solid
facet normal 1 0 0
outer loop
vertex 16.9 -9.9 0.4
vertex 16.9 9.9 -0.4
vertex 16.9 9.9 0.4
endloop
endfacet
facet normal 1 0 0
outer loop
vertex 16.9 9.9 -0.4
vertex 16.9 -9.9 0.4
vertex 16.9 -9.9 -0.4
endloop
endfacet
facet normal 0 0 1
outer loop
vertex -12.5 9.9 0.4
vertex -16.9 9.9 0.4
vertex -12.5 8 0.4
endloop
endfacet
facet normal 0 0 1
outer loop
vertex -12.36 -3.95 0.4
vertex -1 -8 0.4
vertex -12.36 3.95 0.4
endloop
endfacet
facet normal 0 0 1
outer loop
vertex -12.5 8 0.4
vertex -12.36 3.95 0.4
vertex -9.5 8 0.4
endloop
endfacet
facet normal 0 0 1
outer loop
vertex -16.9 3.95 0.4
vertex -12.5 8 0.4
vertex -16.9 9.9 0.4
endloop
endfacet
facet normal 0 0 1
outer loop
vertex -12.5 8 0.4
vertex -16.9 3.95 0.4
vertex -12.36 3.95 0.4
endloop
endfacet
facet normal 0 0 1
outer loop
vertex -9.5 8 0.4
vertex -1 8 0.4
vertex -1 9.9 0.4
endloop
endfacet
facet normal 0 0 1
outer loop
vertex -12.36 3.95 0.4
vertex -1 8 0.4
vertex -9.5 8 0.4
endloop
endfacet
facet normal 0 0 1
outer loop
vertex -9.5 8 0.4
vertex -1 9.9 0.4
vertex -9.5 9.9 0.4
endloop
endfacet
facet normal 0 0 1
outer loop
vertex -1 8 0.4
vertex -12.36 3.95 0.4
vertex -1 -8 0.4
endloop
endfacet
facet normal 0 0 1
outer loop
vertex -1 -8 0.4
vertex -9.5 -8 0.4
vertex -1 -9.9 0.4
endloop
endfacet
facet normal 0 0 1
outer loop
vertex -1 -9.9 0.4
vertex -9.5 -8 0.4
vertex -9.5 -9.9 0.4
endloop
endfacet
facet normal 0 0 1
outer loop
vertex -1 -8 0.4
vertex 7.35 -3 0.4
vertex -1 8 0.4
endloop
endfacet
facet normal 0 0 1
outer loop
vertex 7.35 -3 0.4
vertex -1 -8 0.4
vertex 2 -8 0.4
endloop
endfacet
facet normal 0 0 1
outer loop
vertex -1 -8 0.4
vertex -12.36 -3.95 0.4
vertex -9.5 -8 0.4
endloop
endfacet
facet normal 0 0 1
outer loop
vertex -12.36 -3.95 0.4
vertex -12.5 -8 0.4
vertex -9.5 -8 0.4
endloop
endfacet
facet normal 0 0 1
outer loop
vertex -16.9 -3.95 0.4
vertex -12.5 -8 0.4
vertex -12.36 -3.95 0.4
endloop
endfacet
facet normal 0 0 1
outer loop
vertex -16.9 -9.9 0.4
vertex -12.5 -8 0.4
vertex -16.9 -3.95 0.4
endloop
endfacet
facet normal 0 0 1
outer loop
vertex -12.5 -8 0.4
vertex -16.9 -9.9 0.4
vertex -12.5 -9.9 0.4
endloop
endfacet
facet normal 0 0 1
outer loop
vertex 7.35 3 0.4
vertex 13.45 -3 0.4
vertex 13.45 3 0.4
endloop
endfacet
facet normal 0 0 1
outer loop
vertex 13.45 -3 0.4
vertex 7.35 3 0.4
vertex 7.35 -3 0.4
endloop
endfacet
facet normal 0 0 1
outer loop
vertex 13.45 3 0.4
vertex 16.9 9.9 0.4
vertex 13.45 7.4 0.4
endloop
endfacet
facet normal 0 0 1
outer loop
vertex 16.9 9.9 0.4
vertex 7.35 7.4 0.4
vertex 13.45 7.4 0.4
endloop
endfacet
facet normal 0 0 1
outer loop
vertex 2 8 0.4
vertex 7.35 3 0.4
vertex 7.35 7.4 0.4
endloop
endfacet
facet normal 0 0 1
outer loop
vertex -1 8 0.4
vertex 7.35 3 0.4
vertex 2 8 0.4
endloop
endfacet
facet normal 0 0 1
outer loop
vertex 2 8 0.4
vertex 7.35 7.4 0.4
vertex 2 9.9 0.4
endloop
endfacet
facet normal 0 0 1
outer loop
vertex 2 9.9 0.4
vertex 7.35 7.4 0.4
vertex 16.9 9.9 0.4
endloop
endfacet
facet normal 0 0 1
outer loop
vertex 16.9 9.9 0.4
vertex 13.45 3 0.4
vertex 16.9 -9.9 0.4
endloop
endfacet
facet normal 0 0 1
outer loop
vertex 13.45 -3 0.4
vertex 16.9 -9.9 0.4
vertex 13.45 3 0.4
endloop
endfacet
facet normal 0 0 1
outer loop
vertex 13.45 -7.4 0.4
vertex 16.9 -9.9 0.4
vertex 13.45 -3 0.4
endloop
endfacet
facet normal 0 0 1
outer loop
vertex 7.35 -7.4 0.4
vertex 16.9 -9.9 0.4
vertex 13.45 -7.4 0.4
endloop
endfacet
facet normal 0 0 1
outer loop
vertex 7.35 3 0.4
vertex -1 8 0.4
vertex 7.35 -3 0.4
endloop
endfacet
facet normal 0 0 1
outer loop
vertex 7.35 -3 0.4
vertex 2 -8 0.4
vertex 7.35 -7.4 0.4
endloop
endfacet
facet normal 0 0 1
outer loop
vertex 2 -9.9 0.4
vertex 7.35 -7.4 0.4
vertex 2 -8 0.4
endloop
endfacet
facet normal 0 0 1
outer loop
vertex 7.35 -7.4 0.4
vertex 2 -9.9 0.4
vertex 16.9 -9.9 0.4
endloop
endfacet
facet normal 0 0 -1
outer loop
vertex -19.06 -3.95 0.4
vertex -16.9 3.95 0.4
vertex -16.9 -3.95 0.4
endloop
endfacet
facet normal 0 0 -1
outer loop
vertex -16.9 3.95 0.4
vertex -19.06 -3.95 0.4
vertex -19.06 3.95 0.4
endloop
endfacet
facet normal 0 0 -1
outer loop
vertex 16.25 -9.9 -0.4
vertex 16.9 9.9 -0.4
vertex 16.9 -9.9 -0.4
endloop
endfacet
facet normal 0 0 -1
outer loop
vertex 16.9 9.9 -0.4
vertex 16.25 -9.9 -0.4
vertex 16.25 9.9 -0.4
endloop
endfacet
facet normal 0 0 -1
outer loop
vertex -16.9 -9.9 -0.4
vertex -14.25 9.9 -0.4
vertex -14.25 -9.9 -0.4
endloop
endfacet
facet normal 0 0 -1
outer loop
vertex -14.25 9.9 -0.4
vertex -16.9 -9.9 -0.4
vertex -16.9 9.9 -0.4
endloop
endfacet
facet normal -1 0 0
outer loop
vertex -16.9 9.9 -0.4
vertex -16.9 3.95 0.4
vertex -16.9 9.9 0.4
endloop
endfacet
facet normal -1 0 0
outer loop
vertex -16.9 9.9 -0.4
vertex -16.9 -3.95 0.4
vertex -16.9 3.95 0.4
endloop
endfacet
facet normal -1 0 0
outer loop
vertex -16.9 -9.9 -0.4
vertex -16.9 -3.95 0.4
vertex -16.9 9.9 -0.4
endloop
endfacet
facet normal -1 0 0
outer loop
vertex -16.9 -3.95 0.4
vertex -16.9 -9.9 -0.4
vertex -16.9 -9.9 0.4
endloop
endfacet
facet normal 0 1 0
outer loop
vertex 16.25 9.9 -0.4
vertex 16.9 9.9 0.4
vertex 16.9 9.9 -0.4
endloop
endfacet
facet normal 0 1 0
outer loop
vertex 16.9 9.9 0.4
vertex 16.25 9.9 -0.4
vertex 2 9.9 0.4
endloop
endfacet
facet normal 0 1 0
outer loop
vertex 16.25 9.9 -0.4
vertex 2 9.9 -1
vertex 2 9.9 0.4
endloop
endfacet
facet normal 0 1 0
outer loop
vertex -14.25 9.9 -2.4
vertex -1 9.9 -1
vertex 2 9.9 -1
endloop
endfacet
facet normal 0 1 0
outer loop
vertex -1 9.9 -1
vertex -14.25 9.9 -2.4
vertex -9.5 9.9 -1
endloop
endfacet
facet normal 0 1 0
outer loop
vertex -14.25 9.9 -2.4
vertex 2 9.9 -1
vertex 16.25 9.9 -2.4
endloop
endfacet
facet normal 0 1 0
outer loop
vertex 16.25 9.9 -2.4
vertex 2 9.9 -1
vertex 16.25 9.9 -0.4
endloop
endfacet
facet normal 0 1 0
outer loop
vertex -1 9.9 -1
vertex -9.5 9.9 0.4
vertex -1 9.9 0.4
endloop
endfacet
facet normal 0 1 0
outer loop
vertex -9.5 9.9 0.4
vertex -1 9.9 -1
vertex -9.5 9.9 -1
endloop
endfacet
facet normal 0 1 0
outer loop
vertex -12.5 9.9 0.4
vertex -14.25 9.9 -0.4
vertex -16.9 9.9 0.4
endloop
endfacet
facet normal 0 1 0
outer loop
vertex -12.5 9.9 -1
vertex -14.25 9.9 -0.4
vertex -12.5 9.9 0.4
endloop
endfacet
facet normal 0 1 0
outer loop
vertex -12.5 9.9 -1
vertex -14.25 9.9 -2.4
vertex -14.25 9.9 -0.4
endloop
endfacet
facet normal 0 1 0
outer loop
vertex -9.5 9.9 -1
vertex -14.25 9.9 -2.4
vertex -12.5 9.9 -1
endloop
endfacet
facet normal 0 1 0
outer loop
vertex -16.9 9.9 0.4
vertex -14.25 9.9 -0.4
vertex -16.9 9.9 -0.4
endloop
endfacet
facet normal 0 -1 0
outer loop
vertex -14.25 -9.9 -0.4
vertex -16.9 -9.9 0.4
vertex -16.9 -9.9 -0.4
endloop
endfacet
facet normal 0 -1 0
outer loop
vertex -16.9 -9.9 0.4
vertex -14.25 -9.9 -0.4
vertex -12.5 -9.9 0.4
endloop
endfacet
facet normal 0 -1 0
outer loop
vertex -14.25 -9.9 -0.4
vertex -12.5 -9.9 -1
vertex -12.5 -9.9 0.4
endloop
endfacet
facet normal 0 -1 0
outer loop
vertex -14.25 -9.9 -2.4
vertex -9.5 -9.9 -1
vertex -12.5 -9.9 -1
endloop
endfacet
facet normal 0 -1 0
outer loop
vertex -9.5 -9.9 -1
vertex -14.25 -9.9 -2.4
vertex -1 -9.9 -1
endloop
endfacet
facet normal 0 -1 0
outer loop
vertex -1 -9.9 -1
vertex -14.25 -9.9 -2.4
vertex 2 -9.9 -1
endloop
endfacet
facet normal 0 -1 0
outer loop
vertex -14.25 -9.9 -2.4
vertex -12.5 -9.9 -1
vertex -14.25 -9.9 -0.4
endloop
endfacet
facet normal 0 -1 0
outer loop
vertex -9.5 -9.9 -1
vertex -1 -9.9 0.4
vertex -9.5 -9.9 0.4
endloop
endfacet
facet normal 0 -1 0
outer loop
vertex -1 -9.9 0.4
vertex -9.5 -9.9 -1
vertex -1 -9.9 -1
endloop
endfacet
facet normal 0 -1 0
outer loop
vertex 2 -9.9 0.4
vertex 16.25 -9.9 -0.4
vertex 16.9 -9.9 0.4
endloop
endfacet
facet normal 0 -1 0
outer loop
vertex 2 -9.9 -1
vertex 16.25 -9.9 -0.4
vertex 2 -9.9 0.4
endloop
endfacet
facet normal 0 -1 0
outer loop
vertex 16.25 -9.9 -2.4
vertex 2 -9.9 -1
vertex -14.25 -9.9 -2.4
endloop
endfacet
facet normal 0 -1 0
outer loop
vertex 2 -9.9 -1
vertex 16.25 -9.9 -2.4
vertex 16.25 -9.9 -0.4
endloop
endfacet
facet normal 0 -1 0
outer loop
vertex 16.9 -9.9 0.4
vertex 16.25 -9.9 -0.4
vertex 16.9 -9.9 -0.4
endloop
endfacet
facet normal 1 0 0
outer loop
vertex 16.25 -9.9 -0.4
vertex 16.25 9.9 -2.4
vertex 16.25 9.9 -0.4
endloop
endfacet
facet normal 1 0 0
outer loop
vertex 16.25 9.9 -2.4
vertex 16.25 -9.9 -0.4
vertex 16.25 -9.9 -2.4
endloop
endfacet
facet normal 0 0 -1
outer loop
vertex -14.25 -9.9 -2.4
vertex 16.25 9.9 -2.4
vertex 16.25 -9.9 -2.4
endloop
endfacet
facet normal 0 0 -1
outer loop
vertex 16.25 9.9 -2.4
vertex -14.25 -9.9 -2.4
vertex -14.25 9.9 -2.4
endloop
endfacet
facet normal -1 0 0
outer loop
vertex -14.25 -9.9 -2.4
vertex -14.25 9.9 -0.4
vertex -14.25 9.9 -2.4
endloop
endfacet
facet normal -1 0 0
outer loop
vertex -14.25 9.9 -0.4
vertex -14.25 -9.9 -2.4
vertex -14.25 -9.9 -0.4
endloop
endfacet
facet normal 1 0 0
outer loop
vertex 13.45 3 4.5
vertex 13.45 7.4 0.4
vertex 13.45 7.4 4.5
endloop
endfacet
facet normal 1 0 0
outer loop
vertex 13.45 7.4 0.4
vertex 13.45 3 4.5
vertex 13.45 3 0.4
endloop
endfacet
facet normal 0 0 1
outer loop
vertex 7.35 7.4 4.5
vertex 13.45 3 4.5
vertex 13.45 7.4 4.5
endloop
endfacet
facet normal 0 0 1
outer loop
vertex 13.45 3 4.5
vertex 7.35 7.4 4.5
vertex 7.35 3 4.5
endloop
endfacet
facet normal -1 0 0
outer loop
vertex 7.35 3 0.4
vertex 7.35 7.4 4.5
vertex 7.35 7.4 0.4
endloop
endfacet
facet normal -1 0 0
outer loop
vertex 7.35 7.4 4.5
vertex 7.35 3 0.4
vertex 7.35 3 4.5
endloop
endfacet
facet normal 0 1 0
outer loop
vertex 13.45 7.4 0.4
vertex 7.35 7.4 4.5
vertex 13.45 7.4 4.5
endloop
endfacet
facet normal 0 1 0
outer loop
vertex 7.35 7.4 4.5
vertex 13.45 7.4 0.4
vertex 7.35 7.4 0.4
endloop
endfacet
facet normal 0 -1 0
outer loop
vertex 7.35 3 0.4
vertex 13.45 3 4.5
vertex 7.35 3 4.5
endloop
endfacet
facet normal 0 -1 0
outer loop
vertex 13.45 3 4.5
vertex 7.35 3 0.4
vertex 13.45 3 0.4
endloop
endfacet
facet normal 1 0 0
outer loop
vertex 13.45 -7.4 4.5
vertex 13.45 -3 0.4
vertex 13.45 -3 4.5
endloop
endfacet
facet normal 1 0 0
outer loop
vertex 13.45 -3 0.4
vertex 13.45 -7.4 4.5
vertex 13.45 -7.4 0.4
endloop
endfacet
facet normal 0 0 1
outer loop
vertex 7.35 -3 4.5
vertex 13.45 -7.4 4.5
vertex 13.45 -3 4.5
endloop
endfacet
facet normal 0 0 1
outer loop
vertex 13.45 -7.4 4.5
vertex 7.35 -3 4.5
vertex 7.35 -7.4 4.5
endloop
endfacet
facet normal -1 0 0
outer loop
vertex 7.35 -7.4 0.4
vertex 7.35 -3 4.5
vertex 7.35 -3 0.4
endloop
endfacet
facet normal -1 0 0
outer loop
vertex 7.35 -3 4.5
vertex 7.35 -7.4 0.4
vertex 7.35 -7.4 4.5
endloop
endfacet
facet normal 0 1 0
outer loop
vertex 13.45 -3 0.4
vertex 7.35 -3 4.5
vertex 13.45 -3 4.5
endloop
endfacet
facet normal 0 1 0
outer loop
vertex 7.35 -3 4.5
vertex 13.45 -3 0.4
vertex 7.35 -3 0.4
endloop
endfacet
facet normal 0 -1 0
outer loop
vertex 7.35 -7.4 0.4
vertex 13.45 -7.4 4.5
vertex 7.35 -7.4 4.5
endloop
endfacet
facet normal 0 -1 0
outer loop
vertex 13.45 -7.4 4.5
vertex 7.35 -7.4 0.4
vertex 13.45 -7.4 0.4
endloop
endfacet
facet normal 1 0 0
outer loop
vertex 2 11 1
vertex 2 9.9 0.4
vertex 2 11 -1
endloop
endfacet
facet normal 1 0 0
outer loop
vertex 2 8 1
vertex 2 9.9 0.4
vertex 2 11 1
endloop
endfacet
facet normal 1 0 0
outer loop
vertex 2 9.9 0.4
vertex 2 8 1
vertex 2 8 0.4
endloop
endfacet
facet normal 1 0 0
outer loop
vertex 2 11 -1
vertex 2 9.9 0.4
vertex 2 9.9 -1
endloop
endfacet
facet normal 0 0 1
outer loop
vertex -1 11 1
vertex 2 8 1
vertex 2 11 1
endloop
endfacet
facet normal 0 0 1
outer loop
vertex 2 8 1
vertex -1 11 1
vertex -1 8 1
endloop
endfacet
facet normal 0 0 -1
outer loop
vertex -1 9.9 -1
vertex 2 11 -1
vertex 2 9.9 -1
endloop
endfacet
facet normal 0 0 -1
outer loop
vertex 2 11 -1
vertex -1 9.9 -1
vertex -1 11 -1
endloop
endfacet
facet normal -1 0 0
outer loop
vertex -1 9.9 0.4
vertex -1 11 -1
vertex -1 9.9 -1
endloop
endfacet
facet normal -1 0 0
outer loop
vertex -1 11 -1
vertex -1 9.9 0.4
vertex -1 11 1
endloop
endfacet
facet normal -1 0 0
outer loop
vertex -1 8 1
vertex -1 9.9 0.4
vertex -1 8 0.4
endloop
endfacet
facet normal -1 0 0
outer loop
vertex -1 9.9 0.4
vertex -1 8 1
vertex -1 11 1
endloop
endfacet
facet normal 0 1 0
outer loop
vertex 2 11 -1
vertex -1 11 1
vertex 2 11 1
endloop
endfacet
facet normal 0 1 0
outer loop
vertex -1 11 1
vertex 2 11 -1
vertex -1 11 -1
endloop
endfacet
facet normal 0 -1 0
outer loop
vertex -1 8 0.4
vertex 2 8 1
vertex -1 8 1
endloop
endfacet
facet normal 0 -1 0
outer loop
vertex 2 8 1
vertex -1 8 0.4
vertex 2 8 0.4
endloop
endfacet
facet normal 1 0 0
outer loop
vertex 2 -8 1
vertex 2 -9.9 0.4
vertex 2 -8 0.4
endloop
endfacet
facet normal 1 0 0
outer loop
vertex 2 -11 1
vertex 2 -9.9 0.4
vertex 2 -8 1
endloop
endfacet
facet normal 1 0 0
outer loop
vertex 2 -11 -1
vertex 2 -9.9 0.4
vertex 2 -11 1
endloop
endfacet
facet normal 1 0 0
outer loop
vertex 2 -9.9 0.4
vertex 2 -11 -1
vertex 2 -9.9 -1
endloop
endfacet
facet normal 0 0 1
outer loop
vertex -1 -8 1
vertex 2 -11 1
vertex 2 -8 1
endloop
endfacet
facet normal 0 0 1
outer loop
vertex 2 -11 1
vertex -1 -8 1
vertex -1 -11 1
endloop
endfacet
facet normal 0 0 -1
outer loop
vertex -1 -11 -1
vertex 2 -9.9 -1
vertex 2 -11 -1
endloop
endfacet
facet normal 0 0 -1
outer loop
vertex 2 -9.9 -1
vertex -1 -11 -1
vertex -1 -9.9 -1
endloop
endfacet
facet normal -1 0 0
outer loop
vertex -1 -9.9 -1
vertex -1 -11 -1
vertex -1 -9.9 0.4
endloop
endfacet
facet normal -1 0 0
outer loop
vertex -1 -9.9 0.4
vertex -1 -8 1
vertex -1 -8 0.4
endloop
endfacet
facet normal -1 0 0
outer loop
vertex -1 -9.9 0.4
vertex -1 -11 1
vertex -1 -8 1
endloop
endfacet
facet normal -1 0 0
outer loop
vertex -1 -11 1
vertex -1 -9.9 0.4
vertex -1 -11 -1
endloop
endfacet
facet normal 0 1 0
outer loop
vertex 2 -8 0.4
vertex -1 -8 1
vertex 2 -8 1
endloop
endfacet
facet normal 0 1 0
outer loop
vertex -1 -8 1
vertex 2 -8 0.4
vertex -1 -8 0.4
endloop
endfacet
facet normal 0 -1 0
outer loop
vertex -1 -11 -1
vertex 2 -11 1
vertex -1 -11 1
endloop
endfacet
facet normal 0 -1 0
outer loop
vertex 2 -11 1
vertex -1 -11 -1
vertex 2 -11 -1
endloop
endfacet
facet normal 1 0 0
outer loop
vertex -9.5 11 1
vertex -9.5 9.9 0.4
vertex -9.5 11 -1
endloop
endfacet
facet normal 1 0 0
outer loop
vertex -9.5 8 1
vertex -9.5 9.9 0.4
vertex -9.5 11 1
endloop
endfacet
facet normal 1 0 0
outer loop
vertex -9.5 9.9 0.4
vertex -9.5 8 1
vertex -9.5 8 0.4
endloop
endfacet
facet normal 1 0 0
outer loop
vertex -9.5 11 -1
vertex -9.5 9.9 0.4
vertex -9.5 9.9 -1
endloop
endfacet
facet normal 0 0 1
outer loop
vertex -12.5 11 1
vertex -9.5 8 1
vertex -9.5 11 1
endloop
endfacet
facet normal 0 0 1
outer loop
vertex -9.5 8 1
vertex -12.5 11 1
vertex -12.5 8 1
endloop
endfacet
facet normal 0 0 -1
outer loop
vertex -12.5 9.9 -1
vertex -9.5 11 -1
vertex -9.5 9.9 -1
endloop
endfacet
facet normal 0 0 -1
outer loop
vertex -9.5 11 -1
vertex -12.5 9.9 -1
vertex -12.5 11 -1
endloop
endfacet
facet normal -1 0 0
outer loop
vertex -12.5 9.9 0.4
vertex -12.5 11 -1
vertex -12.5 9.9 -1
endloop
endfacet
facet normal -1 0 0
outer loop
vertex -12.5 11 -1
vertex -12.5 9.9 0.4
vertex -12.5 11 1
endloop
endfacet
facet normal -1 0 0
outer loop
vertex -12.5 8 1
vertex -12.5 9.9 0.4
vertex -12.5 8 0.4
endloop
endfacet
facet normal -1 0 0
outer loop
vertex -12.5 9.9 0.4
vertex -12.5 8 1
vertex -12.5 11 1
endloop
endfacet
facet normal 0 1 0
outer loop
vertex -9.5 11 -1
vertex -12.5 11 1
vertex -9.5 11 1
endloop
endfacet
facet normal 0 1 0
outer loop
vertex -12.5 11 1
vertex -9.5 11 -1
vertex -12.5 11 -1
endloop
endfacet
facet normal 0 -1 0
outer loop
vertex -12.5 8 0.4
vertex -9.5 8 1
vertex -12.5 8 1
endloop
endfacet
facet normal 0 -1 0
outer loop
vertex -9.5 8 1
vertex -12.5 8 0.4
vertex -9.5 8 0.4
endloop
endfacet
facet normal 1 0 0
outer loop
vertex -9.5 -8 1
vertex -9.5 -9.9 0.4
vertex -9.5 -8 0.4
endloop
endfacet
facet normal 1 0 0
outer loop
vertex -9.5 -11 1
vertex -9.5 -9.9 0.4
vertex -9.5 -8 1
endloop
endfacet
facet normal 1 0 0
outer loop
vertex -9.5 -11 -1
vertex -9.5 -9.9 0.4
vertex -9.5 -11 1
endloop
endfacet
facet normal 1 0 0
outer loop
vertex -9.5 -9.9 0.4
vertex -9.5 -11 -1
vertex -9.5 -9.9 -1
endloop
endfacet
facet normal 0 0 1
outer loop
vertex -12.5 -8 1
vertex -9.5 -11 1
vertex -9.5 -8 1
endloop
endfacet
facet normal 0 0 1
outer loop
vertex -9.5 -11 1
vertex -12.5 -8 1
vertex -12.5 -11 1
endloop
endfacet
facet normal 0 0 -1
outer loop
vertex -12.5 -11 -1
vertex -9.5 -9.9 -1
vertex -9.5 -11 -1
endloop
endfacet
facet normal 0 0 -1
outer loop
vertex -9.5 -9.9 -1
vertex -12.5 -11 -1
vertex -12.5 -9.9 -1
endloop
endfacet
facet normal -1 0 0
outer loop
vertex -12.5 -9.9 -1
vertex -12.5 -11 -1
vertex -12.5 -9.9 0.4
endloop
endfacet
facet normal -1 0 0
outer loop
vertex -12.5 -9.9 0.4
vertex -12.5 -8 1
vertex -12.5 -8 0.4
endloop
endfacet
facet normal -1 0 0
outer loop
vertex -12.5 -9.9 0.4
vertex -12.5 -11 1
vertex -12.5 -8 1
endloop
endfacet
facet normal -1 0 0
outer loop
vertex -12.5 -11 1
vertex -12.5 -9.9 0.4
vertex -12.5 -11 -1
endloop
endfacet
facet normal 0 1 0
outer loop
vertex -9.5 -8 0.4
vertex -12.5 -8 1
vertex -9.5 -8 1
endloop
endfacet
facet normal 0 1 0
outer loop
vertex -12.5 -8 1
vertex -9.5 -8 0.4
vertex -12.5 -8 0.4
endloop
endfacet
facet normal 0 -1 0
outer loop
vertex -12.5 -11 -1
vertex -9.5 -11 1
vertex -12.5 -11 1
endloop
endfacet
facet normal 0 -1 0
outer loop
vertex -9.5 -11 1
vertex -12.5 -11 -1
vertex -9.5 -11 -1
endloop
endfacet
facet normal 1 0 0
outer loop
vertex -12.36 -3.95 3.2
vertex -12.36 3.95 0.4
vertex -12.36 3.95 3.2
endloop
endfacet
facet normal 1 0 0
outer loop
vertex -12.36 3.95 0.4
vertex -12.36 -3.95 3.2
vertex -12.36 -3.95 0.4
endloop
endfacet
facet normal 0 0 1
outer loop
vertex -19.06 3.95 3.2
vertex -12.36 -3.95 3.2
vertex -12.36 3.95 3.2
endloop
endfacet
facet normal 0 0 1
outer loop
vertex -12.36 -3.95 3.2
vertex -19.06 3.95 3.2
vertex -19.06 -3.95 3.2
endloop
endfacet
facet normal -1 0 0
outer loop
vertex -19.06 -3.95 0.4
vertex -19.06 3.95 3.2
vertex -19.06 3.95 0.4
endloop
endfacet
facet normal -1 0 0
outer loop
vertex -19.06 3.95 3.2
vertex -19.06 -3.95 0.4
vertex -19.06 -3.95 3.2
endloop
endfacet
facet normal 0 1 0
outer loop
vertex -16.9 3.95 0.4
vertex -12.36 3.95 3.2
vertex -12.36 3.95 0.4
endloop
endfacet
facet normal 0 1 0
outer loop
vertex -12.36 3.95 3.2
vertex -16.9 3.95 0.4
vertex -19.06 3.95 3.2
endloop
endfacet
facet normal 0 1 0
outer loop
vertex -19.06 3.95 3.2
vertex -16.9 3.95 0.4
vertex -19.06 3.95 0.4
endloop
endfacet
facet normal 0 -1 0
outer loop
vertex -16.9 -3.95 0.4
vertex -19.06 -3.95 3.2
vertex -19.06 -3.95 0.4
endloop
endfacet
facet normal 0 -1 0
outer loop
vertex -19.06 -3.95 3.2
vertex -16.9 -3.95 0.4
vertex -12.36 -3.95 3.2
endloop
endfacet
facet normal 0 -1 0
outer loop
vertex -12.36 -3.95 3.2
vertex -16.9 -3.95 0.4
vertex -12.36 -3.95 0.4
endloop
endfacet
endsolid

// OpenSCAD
METALLIC = "silver";

BOARD_WIDTH = 19.8;
SLIM_BOARD_HEIGHT = 0.8;
SLIM_BOARD_LENGTH = 33.8;

function half(x) = x / 2;

module slim_board() {

	center_translation = [-half(SLIM_BOARD_LENGTH),-half(BOARD_WIDTH),-half(SLIM_BOARD_HEIGHT)];

    color("green")
		translate(center_translation)
			cube([SLIM_BOARD_LENGTH,BOARD_WIDTH,SLIM_BOARD_HEIGHT]);

}

module fat_board() {

	length = 30.5;
	height = 2;
	front_ledge = 1;

	translate_x = front_ledge-half(length);
	translate_y = -half(BOARD_WIDTH);
	translate_z = -half(SLIM_BOARD_HEIGHT)-height;

    color("green")
		translate([translate_x,translate_y,translate_z])
			cube([length,BOARD_WIDTH,height]);

}

module board() {

	slim_board();
	fat_board();

}


module front_connector() {

	length = 6.7;
	width = 7.9;
	height = 2.8;

	ledge = 2.16;

	translate_x = -half(SLIM_BOARD_LENGTH)-ledge;
	translate_y = -half(width);
	translate_z = half(SLIM_BOARD_HEIGHT);

    color(METALLIC)
		translate([translate_x,translate_y,translate_z])
			cube([length,width,height]);

}

module old_rear_connectors() {

    color("white")  translate([  29.48/2-3-4.4,3,0.4]) cube([ 6.1, 4.4,4.1], center=false);
    color("white")  translate([  29.48/2-3-4.4,-7.4,0.4]) cube([ 6.1, 4.4,4.1], center=false);

}

module rear_connectors() {
	
	length = 6.1;
	width = 4.4;
	height = 4.1;

	connector_dimmensions = [length,width,height];
	rear_separation = -3.45;
	center_separation = 3;

	translate_x = half(SLIM_BOARD_LENGTH)-length+rear_separation;
	translate_z = half(SLIM_BOARD_HEIGHT);

    color("white")
		translate([translate_x,center_separation,translate_z])
			cube(connector_dimmensions);
    
	color("white")
		translate([translate_x,-center_separation-width,translate_z])
			cube(connector_dimmensions);

}


module holders() {

	center_holders_pair();	
	front_holders_pair();

}


module center_holders_pair() {

	positioned_holder([0.5, 9.5,0]);
	positioned_holder([0.5,-9.5,0]);

}

module front_holders_pair() {

	positioned_holder([-11,9.5,0]);
	positioned_holder([-11,-9.5,0]);

}

module positioned_holder(traslation) {
	
	length = 3;
	width = 3;
	height = 2;

	dimensions = [length,width,height];

	center_translation = [-half(length),-half(width),-half(height)];
    color("red")
		translate(traslation)
			translate(center_translation)
				cube(dimensions);

}


module scisky() {

	board();
	front_connector();
	rear_connectors();
	holders();

}
    
scisky();
